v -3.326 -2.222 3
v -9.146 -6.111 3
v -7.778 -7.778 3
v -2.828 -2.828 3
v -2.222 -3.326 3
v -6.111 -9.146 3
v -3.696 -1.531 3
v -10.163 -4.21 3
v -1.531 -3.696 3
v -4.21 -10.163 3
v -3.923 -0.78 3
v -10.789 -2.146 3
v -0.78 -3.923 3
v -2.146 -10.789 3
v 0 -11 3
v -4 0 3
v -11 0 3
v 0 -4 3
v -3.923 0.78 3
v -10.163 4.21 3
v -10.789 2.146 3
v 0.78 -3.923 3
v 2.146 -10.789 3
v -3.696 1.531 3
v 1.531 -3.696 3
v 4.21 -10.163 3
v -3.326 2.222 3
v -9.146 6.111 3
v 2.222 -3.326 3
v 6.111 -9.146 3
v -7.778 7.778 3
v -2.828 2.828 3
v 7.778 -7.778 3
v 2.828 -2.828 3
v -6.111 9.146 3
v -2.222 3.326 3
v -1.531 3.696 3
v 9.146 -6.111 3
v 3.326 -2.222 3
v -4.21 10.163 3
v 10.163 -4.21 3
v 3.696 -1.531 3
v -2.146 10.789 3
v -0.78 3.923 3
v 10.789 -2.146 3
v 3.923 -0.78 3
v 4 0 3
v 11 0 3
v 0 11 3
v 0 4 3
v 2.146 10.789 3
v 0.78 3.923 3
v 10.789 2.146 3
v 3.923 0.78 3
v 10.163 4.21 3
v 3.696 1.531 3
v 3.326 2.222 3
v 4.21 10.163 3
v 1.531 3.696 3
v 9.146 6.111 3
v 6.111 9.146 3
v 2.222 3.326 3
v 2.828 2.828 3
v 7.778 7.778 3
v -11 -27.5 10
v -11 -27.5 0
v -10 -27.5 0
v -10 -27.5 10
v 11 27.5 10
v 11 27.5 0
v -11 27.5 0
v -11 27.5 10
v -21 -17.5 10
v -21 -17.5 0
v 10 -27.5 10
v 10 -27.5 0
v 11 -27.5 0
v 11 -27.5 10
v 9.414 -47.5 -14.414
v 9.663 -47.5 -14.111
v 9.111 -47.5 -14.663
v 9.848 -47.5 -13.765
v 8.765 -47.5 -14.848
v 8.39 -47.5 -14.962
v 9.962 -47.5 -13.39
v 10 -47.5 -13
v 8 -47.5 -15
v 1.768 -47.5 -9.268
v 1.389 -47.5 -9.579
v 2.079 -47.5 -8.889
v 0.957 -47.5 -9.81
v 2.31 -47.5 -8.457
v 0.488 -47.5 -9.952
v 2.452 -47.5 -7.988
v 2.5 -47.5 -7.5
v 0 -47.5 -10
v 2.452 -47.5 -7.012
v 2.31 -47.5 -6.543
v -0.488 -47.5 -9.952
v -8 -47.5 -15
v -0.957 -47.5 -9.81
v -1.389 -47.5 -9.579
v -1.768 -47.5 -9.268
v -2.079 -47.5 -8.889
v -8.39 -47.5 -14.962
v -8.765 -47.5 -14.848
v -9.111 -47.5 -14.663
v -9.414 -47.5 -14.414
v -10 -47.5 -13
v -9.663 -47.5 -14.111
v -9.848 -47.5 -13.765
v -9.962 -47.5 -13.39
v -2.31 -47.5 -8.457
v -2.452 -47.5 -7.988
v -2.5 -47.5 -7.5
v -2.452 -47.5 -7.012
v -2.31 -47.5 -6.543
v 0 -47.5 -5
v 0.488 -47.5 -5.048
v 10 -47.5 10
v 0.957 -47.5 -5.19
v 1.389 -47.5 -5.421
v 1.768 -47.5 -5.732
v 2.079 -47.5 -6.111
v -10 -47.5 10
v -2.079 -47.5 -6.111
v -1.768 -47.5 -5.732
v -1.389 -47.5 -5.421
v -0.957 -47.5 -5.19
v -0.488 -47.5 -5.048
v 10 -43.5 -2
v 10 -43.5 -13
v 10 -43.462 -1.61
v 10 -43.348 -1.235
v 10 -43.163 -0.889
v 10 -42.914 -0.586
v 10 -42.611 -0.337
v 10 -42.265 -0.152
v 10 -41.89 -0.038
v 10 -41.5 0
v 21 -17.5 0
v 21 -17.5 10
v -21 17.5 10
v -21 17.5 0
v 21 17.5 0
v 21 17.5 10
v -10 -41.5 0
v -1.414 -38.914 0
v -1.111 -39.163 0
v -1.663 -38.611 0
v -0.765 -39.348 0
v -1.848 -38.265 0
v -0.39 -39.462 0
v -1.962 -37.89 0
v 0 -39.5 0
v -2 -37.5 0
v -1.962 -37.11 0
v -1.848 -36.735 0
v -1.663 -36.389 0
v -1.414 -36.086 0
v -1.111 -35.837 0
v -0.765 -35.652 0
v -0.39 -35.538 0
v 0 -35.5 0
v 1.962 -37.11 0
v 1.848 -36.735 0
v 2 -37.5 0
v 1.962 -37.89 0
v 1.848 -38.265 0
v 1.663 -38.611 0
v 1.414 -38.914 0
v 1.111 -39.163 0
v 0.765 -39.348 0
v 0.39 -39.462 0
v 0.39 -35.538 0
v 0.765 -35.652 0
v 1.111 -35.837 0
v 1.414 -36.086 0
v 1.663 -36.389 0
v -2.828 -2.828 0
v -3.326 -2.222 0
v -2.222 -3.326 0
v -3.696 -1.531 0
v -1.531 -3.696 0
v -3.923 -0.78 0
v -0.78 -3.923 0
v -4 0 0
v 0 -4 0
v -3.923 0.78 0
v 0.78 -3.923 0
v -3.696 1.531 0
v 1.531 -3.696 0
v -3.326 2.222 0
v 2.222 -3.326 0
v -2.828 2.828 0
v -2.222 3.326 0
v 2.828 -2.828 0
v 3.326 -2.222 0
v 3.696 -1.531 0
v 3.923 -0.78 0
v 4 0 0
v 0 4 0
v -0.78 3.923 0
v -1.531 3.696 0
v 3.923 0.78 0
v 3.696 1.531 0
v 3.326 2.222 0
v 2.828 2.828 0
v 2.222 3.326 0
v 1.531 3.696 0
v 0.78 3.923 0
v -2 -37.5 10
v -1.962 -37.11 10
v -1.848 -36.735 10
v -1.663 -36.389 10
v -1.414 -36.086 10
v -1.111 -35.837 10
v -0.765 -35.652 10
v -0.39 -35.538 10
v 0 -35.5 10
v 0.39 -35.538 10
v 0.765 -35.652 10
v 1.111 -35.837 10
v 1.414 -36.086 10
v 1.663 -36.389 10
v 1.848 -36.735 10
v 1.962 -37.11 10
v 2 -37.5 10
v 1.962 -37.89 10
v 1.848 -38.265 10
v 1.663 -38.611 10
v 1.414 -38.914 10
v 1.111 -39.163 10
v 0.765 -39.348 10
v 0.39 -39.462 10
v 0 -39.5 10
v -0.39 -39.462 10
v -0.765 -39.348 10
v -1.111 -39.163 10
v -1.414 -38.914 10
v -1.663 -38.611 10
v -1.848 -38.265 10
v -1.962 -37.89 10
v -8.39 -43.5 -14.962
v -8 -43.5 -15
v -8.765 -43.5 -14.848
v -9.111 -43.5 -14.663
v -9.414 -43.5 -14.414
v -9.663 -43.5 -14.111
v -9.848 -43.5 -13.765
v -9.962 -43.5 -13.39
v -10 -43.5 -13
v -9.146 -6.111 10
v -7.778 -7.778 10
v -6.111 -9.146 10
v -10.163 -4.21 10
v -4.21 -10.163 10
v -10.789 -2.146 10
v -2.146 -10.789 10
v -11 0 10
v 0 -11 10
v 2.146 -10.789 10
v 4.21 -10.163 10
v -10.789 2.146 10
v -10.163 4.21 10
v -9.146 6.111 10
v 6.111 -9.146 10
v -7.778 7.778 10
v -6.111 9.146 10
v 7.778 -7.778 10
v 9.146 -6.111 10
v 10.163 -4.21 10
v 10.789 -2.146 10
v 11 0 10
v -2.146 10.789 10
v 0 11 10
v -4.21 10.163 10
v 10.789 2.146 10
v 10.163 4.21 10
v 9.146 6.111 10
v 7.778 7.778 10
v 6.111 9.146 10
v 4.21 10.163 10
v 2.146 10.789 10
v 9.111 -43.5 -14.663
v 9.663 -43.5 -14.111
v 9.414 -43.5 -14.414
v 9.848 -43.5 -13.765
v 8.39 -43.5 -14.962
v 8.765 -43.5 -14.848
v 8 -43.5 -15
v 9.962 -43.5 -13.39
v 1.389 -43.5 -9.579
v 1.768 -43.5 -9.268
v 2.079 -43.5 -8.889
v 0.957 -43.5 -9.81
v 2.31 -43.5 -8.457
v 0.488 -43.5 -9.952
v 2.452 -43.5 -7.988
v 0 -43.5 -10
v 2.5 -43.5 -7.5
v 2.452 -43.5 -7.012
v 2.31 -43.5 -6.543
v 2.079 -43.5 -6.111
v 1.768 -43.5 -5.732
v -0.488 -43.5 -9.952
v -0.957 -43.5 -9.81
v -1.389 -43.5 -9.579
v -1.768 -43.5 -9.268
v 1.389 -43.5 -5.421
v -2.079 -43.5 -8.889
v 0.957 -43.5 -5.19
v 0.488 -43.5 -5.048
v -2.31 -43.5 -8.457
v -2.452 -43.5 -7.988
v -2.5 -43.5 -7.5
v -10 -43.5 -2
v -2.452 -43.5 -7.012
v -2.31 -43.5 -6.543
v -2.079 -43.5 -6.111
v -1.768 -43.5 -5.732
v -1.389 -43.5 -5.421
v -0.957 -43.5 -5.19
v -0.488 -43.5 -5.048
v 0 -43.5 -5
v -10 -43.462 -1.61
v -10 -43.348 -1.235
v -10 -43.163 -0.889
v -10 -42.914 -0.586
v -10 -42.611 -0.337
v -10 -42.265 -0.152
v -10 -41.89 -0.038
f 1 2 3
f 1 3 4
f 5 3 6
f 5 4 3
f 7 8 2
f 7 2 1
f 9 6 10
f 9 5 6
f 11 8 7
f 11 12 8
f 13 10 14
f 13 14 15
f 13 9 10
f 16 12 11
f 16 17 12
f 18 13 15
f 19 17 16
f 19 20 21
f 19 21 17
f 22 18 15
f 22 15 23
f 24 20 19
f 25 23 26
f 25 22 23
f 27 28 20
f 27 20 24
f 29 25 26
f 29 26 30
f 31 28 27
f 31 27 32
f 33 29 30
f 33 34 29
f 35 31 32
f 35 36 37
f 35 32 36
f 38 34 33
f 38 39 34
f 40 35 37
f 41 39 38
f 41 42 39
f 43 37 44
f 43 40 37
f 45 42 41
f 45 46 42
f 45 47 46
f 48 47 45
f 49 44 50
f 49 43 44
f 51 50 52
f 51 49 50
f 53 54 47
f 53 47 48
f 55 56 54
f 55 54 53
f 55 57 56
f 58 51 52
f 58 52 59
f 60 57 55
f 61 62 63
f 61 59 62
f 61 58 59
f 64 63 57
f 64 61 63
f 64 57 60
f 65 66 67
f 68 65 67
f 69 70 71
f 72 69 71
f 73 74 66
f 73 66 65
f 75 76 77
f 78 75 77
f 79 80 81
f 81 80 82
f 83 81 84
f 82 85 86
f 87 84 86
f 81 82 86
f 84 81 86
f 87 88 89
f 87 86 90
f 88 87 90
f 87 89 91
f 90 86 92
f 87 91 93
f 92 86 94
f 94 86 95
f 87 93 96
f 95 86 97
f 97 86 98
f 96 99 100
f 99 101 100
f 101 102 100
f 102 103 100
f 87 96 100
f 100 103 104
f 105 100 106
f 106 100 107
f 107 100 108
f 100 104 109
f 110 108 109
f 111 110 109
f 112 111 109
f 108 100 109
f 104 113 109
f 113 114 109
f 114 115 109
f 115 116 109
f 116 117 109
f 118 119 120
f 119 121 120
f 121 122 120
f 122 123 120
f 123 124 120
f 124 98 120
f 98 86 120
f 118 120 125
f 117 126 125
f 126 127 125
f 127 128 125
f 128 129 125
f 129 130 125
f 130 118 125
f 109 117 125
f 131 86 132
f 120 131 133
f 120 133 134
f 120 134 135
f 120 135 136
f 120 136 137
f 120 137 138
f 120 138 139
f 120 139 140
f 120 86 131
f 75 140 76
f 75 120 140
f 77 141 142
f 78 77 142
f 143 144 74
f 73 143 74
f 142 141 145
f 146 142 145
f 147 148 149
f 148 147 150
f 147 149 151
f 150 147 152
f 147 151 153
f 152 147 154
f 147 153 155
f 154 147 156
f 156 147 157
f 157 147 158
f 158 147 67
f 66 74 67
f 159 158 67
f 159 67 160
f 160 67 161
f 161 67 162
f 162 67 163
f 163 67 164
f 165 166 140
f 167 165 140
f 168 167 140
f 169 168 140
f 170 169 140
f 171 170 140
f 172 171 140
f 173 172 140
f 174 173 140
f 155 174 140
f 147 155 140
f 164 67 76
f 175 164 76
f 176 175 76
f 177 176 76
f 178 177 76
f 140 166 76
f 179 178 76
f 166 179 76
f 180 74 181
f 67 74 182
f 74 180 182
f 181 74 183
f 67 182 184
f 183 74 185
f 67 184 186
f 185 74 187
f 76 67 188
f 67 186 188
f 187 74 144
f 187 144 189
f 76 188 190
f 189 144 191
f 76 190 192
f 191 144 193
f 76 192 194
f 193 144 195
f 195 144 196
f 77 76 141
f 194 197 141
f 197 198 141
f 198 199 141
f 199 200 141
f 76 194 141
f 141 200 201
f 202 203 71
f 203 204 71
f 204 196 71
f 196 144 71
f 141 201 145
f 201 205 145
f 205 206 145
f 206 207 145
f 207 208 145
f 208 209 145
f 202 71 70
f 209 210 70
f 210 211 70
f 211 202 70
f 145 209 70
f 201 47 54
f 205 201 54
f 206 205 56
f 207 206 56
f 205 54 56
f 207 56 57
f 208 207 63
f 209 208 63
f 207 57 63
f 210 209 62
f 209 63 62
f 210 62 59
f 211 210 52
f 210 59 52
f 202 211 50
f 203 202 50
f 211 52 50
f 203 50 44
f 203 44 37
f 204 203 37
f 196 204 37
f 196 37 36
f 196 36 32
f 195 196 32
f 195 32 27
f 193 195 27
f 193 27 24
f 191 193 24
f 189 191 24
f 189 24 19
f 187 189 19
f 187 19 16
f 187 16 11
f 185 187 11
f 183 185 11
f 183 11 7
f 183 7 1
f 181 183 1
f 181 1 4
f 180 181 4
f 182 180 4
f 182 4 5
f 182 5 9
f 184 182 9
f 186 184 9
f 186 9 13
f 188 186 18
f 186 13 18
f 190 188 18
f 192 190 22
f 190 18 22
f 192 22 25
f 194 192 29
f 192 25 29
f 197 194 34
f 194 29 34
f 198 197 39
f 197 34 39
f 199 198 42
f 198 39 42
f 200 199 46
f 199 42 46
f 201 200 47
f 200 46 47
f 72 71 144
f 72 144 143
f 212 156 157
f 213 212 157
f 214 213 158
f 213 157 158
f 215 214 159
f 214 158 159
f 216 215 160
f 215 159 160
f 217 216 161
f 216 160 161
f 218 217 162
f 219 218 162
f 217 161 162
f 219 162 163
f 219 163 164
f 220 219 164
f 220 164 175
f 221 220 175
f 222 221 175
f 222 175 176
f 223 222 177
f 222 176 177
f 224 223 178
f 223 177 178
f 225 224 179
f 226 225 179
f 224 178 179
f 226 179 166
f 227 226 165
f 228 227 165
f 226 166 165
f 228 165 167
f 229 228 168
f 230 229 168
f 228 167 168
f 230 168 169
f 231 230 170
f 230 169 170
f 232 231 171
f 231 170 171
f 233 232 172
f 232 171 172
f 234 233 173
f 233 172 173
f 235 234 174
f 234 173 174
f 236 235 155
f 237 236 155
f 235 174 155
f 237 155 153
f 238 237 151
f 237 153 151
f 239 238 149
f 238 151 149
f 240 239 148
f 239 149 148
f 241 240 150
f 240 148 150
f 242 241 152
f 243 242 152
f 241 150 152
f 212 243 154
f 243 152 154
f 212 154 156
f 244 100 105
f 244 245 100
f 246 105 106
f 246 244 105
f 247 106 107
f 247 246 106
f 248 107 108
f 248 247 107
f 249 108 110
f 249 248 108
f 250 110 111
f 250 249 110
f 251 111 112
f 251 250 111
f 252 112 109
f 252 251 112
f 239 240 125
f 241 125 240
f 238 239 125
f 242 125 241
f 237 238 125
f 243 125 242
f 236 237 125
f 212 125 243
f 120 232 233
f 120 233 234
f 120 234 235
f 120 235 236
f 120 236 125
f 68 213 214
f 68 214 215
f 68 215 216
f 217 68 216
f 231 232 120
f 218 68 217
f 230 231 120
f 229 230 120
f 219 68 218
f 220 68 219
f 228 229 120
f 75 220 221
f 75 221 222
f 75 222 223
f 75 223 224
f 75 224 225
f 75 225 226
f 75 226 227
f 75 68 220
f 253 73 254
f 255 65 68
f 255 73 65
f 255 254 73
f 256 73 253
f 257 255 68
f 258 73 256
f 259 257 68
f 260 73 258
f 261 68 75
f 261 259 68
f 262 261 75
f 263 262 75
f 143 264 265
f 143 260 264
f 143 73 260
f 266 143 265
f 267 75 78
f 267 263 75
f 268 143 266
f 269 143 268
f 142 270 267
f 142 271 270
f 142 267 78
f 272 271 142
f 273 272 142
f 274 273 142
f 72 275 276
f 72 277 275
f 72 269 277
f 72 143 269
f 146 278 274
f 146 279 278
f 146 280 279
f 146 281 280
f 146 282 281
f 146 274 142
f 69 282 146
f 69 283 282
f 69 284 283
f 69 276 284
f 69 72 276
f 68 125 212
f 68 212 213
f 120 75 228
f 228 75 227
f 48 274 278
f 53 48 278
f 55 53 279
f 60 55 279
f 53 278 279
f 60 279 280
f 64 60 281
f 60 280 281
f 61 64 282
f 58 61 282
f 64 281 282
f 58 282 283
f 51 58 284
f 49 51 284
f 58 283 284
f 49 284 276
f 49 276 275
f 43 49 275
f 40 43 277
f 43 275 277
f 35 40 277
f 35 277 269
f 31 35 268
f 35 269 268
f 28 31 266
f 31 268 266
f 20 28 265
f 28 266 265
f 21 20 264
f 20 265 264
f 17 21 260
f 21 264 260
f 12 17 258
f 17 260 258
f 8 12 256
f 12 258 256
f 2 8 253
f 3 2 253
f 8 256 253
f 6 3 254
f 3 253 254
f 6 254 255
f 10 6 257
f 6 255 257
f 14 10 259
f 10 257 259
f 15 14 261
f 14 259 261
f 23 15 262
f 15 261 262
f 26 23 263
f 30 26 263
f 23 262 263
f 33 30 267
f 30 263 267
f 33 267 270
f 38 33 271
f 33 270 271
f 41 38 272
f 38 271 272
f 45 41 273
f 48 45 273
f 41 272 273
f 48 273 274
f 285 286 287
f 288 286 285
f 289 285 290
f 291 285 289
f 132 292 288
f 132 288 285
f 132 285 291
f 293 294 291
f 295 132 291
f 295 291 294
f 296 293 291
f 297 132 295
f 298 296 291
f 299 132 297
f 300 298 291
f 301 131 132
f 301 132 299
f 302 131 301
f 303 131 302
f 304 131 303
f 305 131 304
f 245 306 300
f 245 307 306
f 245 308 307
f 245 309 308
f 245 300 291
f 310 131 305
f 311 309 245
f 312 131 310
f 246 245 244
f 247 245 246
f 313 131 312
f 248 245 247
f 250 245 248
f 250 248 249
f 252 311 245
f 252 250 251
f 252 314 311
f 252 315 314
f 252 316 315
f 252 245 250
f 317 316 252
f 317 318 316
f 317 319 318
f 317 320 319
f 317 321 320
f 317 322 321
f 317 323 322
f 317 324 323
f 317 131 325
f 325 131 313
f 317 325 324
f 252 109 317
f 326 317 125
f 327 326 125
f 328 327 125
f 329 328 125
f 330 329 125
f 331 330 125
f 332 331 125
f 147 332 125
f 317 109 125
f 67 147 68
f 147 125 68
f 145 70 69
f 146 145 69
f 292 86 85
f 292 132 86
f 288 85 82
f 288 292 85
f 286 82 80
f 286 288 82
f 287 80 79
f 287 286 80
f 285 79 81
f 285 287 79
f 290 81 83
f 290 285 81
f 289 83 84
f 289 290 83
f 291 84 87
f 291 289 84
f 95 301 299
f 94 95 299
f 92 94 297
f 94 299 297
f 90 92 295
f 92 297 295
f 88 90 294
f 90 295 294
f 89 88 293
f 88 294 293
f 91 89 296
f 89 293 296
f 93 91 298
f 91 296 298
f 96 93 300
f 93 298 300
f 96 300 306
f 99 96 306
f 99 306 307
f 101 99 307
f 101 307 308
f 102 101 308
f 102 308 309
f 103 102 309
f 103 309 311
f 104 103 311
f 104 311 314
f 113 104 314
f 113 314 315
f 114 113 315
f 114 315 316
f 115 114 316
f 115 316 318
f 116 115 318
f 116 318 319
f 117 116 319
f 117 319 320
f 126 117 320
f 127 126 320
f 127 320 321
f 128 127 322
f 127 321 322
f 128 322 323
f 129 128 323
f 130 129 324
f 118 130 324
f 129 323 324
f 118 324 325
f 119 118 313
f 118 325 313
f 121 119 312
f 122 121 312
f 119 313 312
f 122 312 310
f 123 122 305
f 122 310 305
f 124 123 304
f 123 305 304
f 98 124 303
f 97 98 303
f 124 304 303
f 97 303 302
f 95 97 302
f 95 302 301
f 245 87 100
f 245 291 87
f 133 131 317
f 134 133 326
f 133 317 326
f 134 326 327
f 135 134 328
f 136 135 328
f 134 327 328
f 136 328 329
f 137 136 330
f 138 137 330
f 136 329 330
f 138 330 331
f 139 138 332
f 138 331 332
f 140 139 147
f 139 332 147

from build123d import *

# Parameters (mm, degrees)
ESTRUSIONE_ESTRUSIONE1_DEPTH = 10
SCHIZZO6_R                   = 11
TAGLIO_ESTRUSIONE4_DEPTH     = 7
SCHIZZO7_R                   = 4
TAGLIO_ESTRUSIONE5_DEPTH     = 4
SMUSSO2_SIZE                 = 10
SCHIZZO8_W                   = 20
SCHIZZO8_H                   = 4
ESTRUSIONE_ESTRUSIONE3_DEPTH = 15
SCHIZZO9_R                   = 2.5
TAGLIO_ESTRUSIONE6_DEPTH     = 35
RACCORDO1_R                  = 2
SCHIZZO10_R                  = 2
TAGLIO_ESTRUSIONE7_DEPTH     = 10


with BuildPart() as part:
    # Schizzo1 → Estrusione-Estrusione1 (new body)
    with BuildSketch(Plane.XY):
        Polygon((-10, -47.5), (10, -47.5), (10, -27.5), (21, -27.5), (21, 27.5), (-21, 27.5), (-21, -27.5), (-10, -27.5), align=None)
    extrude(amount=ESTRUSIONE_ESTRUSIONE1_DEPTH)

    # Schizzo6 → Taglio-Estrusione4 (cut)
    with BuildSketch(Plane.XY.offset(10)):
        Circle(SCHIZZO6_R)
    extrude(amount=-TAGLIO_ESTRUSIONE4_DEPTH, mode=Mode.SUBTRACT)

    # Schizzo7 → Taglio-Estrusione5 (cut, through all)
    with BuildSketch(Plane.XY.offset(3)):
        Circle(SCHIZZO7_R)
    extrude(amount=-TAGLIO_ESTRUSIONE5_DEPTH, mode=Mode.SUBTRACT)

    # Smusso2
    smusso2_edges = [part.edges().sort_by_distance(p)[0] for p in [
        (21, -27.5, 5),
        (-21, -27.5, 5),
        (-21, 27.5, 5),
        (21, 27.5, 5),
    ]]
    chamfer(smusso2_edges, length=SMUSSO2_SIZE)

    # Schizzo8 → Estrusione-Estrusione3 (add)
    with BuildSketch(Plane(origin=(0, 0, 0), x_dir=(-1, 0, 0), z_dir=(0, 0, -1))):
        with Locations((0, -45.5)):
            Rectangle(SCHIZZO8_W, SCHIZZO8_H)
    extrude(amount=ESTRUSIONE_ESTRUSIONE3_DEPTH)

    # Schizzo9 → Taglio-Estrusione6 (cut)
    with BuildSketch(Plane(origin=(0, -43.5, 0), x_dir=(1, 0, 0), z_dir=(0, 1, 0))):
        with Locations((0, 7.5)):
            Circle(SCHIZZO9_R)
    extrude(amount=-TAGLIO_ESTRUSIONE6_DEPTH, mode=Mode.SUBTRACT)

    # Raccordo1
    raccordo1_edges = [part.edges().sort_by_distance(p)[0] for p in [
        (0, -43.5, 0),
        (10, -45.5, -15),
        (-10, -45.5, -15),
    ]]
    fillet(raccordo1_edges, radius=RACCORDO1_R)

    # Schizzo10 → Taglio-Estrusione7 (cut)
    with BuildSketch(Plane(origin=(0, 0, 0), x_dir=(-1, 0, 0), z_dir=(0, 0, -1))):
        with Locations((0, -37.5)):
            Circle(SCHIZZO10_R)
    extrude(amount=-TAGLIO_ESTRUSIONE7_DEPTH, mode=Mode.SUBTRACT)


solid = part.part
